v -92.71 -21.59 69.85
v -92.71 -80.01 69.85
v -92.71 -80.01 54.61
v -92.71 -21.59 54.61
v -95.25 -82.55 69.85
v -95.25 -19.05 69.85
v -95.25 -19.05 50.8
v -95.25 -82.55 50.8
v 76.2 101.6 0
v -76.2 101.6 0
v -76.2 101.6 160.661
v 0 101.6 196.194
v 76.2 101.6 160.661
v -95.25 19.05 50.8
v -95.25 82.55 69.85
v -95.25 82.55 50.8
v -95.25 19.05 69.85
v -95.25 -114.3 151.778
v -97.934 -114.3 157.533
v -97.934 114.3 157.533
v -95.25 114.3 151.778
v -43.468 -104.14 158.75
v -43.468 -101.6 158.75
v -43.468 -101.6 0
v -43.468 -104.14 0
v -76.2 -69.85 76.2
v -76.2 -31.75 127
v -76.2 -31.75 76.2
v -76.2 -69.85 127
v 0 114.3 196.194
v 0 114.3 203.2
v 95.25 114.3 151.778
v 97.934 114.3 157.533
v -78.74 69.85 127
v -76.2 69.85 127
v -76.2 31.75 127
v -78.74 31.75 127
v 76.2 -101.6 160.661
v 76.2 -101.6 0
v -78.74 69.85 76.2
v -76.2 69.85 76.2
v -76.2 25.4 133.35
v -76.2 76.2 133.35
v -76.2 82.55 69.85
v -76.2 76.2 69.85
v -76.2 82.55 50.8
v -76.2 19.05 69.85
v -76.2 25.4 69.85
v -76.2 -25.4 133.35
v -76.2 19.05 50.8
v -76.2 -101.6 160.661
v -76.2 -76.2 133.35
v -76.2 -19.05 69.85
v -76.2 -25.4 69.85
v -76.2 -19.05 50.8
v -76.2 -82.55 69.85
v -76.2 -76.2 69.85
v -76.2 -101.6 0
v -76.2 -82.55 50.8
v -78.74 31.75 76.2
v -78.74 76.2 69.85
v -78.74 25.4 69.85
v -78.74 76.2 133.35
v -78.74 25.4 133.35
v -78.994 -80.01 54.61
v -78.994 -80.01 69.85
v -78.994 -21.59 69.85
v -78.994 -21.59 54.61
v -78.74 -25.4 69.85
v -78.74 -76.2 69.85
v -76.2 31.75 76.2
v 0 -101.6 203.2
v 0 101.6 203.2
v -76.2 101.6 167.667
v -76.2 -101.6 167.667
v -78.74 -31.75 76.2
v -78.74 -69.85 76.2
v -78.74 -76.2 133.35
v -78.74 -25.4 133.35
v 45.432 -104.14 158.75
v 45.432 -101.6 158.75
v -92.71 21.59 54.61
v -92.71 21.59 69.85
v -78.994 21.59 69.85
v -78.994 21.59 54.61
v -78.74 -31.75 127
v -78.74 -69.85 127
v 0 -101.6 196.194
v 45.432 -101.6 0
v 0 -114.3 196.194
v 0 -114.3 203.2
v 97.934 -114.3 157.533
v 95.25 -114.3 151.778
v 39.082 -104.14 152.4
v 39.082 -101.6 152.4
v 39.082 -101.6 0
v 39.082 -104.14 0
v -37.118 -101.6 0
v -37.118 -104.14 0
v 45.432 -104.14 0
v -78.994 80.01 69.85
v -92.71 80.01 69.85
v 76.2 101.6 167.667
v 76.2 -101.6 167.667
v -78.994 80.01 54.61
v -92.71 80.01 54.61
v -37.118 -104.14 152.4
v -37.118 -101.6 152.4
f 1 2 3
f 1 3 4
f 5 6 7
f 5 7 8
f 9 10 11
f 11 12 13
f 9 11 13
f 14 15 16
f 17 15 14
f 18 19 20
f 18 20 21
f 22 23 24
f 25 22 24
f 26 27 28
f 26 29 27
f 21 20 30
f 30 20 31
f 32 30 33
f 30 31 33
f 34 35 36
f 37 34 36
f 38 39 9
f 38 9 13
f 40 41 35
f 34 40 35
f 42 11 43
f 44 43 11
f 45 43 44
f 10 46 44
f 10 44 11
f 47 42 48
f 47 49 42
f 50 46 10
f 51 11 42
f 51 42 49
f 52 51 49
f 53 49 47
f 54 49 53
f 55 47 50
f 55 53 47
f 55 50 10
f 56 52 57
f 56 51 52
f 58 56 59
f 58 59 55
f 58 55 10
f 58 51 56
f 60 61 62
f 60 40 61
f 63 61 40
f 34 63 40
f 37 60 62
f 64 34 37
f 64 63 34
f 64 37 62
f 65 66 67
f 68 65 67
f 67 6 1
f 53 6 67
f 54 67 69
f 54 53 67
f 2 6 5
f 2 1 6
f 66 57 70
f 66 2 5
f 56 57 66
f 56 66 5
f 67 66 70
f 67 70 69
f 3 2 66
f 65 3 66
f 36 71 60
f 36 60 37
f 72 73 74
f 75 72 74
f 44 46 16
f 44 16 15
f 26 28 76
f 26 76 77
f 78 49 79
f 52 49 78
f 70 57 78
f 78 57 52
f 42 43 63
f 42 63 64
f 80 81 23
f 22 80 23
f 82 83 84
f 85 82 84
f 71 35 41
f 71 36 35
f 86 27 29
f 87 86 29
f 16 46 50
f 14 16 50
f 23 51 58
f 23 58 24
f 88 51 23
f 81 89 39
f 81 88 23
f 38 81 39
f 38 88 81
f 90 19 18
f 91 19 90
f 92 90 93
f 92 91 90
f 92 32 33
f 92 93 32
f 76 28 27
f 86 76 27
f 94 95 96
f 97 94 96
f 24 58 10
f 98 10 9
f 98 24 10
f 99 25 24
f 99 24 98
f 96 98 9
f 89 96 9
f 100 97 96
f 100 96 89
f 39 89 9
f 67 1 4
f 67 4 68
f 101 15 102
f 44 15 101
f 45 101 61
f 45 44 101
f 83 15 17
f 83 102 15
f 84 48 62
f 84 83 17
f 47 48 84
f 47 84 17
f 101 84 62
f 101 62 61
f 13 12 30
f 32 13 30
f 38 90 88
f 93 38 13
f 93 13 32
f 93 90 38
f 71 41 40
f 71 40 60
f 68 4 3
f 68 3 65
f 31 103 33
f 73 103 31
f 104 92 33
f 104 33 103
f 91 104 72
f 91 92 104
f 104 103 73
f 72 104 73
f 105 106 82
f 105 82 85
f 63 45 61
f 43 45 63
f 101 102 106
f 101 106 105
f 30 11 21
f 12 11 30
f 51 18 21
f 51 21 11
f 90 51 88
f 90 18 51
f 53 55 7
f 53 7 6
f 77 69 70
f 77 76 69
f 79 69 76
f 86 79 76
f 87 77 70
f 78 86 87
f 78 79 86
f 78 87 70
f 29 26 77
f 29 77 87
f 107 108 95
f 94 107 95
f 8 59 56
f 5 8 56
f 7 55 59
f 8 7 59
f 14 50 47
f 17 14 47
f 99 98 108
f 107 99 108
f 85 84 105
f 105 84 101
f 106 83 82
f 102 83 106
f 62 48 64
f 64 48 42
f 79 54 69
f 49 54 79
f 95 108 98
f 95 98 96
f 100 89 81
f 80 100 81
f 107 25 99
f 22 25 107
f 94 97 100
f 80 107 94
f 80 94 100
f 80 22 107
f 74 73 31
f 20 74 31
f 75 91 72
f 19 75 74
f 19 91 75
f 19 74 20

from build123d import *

# Parameters (mm, degrees)
F1_DEPTH  = 101.6
F3_DEPTH  = 2.54
F5_DEPTH  = 114.3
F6_W      = 50.8
F6_H      = 63.5
F6_W_2    = 38.1
F6_H_2    = 50.8
F7_DEPTH  = 2.54
F8_W      = 63.5
F8_H      = 19.05
F9_DEPTH  = 19.05
F10_W     = 13.716
F10_H     = 58.42
F11_DEPTH = 15.24


with BuildPart() as f1:
    # F0 (on Front) → F1 (new body, symmetric)
    with BuildSketch(Plane.XZ):
        Polygon((-76.2, 167.667356), (-76.2, 0), (76.2, 0), (76.2, 167.667356), (0, 203.2), align=None)
    extrude(amount=F1_DEPTH, both=True)

    # F2 (on face) → F3 (join)
    with BuildSketch(Plane.XZ.offset(101.6)):
        Polygon((-37.118237, 0), (-37.118237, 152.4), (39.081763, 152.4), (39.081763, 0), (45.431763, 0), (45.431763, 158.75), (-43.468237, 158.75), (-43.468237, 0), align=None)
    extrude(amount=F3_DEPTH)

    # F4 (on Front) → F5 (join, symmetric)
    with BuildSketch(Plane.XZ):
        Polygon((97.933626, 157.5328), (0, 203.2), (-97.933626, 157.5328), (-95.25, 151.777746), (0, 196.19355), (95.25, 151.777746), align=None)
    extrude(amount=F5_DEPTH, both=True)

    # F6 (on face) → F7 (join)
    with BuildSketch(Plane(origin=(-76.2, 0, 0), x_dir=(0, -1, 0), z_dir=(-1, 0, 0))):
        with Locations((-50.8, 101.6)):
            Rectangle(F6_W, F6_H)
        with Locations((-50.8, 101.6)):
            Rectangle(F6_W_2, F6_H_2, mode=Mode.SUBTRACT)
        with Locations((50.8, 101.6)):
            Rectangle(F6_W, F6_H)
        with Locations((50.8, 101.6)):
            Rectangle(F6_W_2, F6_H_2, mode=Mode.SUBTRACT)
    extrude(amount=F7_DEPTH)

    # F8 (on face) → F9 (join)
    with BuildSketch(Plane(origin=(-76.2, 0, 0), x_dir=(0, -1, 0), z_dir=(-1, 0, 0))):
        with Locations((-50.8, 60.325)):
            Rectangle(F8_W, F8_H)
        with Locations((50.8, 60.325)):
            Rectangle(F8_W, F8_H)
    extrude(amount=F9_DEPTH)

    # F10 (on face) → F11 (cut)
    with BuildSketch(Plane.XY.offset(69.85)):
        with Locations((-85.852, 50.8)):
            Rectangle(F10_W, F10_H)
        with Locations((-85.852, -50.8)):
            Rectangle(F10_W, F10_H)
    extrude(amount=-F11_DEPTH, mode=Mode.SUBTRACT)


solid = f1.part
